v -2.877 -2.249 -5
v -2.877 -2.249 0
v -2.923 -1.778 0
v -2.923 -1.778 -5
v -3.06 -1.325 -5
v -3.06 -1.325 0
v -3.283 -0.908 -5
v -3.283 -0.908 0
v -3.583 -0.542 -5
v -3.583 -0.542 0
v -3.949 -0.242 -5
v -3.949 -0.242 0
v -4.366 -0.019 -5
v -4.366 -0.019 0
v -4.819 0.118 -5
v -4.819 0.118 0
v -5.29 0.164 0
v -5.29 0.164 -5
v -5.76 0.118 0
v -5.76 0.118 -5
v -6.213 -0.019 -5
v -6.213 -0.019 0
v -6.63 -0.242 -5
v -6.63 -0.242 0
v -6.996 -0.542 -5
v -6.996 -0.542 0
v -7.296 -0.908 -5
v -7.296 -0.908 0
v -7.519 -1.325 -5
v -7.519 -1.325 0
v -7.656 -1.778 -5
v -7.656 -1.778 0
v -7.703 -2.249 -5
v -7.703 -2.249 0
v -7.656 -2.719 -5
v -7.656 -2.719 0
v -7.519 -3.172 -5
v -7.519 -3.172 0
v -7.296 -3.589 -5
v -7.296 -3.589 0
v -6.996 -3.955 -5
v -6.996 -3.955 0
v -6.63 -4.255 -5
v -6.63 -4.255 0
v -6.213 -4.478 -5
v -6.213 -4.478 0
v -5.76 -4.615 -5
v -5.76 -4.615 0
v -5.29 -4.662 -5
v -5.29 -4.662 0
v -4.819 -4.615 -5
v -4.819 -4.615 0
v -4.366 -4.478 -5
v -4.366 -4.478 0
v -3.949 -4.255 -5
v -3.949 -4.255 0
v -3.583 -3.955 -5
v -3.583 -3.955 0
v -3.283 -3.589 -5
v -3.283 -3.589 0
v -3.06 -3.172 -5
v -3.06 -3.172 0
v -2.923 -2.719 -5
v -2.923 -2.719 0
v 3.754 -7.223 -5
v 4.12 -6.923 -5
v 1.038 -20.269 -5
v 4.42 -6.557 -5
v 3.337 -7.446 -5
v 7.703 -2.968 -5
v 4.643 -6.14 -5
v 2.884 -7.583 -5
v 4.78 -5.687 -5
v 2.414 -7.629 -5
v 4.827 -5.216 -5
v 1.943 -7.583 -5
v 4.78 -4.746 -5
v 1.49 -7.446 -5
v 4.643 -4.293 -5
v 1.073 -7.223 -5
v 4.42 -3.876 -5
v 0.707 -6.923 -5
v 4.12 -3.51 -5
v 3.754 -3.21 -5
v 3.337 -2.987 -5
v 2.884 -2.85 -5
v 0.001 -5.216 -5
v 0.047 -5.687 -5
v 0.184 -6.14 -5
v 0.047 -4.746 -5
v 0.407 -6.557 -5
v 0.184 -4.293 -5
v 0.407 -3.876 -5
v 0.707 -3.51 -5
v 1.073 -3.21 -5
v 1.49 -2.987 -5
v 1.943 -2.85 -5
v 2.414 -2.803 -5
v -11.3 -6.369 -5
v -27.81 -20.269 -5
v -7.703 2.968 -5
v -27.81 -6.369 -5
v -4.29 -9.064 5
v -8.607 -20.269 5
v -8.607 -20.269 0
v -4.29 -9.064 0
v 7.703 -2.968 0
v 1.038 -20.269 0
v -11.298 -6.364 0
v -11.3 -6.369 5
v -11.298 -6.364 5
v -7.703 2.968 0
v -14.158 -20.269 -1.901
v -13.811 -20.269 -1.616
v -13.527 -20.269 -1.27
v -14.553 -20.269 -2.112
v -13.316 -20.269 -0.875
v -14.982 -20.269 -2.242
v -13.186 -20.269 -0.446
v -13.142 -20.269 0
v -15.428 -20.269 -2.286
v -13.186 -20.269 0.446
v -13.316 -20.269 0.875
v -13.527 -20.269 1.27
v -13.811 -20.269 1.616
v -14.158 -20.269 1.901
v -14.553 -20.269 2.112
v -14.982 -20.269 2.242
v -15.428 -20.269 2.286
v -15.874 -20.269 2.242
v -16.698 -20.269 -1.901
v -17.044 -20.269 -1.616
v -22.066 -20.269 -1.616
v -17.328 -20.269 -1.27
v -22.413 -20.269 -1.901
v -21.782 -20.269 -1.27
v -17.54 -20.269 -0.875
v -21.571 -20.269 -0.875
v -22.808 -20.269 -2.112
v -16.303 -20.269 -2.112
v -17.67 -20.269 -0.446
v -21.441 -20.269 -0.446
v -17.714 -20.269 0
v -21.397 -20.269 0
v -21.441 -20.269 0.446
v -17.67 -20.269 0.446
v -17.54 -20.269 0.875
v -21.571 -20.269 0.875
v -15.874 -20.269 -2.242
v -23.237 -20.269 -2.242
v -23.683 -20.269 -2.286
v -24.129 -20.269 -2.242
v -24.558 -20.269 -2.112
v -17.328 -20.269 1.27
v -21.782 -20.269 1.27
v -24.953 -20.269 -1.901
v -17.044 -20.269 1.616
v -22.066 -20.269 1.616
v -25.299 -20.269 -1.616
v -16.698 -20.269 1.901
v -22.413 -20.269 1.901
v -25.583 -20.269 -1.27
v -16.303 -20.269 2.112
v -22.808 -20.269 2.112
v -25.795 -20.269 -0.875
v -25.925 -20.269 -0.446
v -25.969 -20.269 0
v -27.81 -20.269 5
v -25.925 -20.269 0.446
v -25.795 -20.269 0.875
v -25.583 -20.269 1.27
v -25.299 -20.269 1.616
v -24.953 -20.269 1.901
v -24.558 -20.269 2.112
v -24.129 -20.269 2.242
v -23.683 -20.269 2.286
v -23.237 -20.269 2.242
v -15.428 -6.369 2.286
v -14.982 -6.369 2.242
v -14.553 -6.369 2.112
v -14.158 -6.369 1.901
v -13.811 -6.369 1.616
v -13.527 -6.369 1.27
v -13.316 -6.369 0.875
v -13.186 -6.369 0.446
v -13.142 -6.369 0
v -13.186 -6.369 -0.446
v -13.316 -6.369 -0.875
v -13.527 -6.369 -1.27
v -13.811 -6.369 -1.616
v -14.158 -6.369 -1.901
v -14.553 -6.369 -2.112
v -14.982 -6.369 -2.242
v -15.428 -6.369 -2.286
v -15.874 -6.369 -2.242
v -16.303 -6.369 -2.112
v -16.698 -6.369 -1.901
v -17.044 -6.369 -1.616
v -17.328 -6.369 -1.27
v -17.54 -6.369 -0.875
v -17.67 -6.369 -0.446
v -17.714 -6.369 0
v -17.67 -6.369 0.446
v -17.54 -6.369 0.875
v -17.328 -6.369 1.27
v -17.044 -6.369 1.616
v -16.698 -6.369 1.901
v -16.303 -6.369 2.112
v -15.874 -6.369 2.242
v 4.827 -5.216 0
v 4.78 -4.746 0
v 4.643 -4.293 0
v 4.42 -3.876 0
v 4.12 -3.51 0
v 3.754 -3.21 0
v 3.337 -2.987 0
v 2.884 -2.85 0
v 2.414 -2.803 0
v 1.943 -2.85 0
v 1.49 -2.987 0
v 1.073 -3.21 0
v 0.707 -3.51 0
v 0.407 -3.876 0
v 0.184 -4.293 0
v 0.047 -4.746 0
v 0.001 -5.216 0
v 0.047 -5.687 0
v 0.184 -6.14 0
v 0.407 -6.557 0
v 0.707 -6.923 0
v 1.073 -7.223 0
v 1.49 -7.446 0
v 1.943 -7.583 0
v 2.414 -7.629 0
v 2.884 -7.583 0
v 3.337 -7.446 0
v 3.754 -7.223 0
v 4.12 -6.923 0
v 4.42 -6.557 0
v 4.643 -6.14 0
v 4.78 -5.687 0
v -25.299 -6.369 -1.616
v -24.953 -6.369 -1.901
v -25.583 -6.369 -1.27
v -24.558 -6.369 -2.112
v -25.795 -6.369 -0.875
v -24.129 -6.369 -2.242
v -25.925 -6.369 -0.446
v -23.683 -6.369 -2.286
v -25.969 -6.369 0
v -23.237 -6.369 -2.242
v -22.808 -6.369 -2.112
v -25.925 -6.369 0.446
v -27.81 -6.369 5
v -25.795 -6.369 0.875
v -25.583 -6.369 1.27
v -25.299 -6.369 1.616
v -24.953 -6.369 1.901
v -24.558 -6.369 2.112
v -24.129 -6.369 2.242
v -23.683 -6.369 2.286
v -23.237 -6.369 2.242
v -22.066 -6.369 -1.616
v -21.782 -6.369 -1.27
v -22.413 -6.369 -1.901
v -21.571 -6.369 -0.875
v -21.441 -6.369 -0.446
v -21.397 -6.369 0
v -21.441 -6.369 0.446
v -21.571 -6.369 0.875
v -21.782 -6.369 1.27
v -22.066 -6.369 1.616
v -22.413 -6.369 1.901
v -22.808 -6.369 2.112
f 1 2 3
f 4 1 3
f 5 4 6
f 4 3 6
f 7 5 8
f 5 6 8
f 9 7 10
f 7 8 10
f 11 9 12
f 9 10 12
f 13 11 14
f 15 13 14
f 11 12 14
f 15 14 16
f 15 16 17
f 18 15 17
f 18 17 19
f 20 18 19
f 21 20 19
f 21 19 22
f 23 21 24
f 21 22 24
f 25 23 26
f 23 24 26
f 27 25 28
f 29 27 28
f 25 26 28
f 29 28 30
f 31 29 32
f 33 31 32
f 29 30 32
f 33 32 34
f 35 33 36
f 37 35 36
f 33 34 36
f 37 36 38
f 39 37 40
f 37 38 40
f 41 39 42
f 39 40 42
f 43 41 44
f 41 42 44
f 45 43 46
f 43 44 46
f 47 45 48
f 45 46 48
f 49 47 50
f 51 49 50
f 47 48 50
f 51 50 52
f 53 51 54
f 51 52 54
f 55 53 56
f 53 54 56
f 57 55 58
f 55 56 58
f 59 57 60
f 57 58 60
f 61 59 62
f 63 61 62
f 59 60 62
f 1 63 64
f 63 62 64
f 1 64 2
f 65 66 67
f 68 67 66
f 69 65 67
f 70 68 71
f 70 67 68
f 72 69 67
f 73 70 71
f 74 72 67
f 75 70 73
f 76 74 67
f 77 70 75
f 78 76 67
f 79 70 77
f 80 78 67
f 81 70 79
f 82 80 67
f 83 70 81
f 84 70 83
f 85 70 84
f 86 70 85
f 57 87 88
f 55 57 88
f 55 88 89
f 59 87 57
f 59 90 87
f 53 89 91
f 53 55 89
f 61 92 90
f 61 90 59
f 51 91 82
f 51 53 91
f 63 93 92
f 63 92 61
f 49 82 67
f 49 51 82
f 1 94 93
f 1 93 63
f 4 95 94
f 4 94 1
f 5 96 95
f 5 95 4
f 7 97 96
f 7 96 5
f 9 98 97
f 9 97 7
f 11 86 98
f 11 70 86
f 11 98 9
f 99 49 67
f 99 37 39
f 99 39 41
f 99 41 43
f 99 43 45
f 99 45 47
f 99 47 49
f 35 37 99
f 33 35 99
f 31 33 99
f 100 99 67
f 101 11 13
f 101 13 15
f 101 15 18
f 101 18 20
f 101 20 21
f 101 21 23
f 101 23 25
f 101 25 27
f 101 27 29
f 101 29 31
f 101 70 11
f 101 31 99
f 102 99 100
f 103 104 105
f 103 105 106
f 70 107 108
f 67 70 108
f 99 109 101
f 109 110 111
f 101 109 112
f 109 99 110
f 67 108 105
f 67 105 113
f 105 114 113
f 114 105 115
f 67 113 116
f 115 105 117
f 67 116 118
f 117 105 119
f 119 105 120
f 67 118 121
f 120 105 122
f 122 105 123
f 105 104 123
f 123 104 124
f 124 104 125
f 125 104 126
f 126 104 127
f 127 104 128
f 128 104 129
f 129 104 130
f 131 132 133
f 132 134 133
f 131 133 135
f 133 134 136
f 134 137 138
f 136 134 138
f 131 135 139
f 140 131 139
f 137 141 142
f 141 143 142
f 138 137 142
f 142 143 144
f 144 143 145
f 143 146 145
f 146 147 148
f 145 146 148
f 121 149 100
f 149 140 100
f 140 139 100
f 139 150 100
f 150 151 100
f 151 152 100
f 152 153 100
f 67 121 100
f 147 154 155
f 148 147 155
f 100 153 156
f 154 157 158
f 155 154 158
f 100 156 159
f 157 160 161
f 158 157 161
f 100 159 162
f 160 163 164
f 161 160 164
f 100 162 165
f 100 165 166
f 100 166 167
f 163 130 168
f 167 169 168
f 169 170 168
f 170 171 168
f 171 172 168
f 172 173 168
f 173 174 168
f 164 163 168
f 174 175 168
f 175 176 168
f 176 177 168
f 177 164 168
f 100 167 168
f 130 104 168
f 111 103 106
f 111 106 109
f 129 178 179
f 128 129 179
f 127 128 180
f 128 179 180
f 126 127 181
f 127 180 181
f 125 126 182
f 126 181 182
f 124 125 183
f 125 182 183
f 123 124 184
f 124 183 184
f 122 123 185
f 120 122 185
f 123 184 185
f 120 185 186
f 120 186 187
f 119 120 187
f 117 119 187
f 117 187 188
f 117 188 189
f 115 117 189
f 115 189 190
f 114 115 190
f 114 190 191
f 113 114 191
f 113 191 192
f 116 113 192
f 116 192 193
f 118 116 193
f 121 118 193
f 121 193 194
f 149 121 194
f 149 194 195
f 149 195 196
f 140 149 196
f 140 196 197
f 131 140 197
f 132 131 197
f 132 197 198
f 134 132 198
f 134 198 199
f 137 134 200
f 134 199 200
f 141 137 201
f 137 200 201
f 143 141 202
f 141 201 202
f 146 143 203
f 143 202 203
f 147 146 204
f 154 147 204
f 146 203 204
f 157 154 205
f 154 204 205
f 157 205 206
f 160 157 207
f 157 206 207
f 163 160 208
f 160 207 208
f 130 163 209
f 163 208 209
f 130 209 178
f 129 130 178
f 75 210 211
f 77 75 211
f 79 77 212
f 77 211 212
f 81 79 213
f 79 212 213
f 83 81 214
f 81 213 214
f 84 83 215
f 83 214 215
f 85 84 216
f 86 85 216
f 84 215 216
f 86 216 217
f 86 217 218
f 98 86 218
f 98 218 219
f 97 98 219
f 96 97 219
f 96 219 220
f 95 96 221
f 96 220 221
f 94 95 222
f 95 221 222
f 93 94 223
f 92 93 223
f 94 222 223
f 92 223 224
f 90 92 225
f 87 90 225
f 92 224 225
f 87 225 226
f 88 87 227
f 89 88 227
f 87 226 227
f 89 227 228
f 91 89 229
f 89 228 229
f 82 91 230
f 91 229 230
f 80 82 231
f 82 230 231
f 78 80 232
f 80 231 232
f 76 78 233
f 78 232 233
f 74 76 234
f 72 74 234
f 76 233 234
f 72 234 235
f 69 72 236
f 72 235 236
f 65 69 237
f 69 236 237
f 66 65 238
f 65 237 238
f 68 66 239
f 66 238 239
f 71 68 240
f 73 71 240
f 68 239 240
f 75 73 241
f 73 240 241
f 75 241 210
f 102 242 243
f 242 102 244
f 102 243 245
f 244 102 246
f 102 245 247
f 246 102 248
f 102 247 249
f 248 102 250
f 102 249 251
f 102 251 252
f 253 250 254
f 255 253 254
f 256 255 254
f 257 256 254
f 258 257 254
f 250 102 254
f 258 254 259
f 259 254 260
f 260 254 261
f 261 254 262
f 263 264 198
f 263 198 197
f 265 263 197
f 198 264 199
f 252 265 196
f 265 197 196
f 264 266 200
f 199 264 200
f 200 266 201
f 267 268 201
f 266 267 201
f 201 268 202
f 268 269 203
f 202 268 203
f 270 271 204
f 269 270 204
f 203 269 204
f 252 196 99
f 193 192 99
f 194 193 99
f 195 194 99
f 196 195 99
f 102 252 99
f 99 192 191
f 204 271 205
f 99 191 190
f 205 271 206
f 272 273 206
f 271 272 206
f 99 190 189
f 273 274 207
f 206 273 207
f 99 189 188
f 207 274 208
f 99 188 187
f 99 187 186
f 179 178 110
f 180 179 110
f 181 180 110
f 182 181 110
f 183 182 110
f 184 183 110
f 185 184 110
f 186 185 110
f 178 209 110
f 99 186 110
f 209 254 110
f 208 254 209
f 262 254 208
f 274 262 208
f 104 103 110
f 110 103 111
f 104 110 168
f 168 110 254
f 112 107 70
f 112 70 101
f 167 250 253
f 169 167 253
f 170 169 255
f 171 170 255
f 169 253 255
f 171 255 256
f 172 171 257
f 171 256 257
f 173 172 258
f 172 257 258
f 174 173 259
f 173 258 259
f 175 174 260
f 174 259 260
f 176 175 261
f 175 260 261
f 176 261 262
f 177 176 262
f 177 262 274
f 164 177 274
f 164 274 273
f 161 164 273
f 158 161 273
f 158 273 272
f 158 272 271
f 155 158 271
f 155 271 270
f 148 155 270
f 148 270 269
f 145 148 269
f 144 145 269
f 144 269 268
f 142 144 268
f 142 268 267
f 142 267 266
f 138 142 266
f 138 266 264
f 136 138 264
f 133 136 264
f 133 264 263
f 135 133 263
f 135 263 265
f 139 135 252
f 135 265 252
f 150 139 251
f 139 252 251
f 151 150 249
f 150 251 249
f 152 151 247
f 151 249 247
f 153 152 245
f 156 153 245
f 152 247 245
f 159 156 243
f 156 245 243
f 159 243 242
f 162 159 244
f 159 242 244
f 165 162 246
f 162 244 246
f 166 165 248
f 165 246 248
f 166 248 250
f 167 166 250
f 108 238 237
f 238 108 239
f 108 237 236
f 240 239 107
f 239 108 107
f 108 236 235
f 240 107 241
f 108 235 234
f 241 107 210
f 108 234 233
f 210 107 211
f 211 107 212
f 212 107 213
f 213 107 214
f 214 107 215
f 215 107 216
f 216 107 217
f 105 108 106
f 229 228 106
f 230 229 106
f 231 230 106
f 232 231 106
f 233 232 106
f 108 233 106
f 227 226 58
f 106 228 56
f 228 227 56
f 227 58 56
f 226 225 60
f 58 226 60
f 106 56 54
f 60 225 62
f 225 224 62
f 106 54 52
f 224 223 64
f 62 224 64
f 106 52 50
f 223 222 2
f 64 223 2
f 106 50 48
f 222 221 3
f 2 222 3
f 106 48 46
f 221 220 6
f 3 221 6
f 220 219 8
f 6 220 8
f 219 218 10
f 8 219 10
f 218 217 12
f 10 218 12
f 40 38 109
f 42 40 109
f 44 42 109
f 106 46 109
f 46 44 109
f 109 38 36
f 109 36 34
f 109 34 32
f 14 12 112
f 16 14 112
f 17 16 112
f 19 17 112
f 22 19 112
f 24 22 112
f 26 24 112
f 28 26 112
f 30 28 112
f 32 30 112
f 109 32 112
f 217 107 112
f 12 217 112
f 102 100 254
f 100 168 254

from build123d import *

# Parameters (mm, degrees)
BASE_EXTRUDE_DEPTH                           = 5
CUTAWAY_FOR_CLAMP_PLATE_WIRE_DEPTH           = 5
SKETCH3_R                                    = 2.413
CLAMP_PLATE_HOLES_ALTERED_TO_10_24_OCT_DEPTH = 5
HOLES_TO_PITCH_PLATE_REACH                   = 15.9
SKETCH4_R                                    = 2.286


with BuildPart() as part:
    # Sketch1 → Base-Extrude (new body, symmetric)
    with BuildSketch(Plane.XY):
        Polygon((-7.703086391, 2.967740731), (0, 0), (7.703086391, -2.967740731), (1.037503031, -20.268970563), (-27.810207986, -20.268970563), (-27.810207986, -6.368970563), (-11.300207986, -6.368970563), align=None)
    extrude(amount=BASE_EXTRUDE_DEPTH, both=True)

    # Sketch2 → Cutaway for Clamp Plate & Wire (cut)
    with BuildSketch(Plane.XY.offset(5)):
        Polygon((-7.703086391, 2.967740731), (7.703086391, -2.967740731), (1.037503031, -20.268970563), (-8.607332328, -20.268970563), (-4.290273371, -9.06358535), (-11.298169046, -6.363678277), align=None)
    extrude(amount=-CUTAWAY_FOR_CLAMP_PLATE_WIRE_DEPTH, mode=Mode.SUBTRACT)

    # Sketch3 → Clamp Plate Holes (altered to #10-24 OCT04) (cut)
    with BuildSketch(Plane.XY):
        with Locations((2.413510134, -5.216437969)):
            Circle(SKETCH3_R)
        with Locations((-5.289576257, -2.248697238)):
            Circle(SKETCH3_R)
    extrude(amount=-CLAMP_PLATE_HOLES_ALTERED_TO_10_24_OCT_DEPTH, mode=Mode.SUBTRACT)

    # Sketch4 → Holes to Pitch Plate (cut, up to next)
    with BuildSketch(Plane(origin=(0, -6.368970563, 0), x_dir=(-1, 0, 0), z_dir=(0, 1, 0)), mode=Mode.PRIVATE) as holes_to_pitch_plate_sk1:
        with Locations((23.682707986, 0)):
            Circle(SKETCH4_R)
    holes_to_pitch_plate_tool1 = extrude(holes_to_pitch_plate_sk1.sketch, amount=-HOLES_TO_PITCH_PLATE_REACH, mode=Mode.PRIVATE) & part.part
    add(holes_to_pitch_plate_tool1.solids().sort_by_distance((-23.682708, -6.368971, 0))[0], mode=Mode.SUBTRACT)
    # Sketch4 → Holes to Pitch Plate (cut, up to next)
    with BuildSketch(Plane(origin=(0, -6.368970563, 0), x_dir=(-1, 0, 0), z_dir=(0, 1, 0)), mode=Mode.PRIVATE) as holes_to_pitch_plate_sk2:
        with Locations(Location((15.427707986, 0, 0), (0, 0, 90))):  # turned: the seam where the file's is
            Circle(SKETCH4_R)
    holes_to_pitch_plate_tool2 = extrude(holes_to_pitch_plate_sk2.sketch, amount=-HOLES_TO_PITCH_PLATE_REACH, mode=Mode.PRIVATE) & part.part
    add(holes_to_pitch_plate_tool2.solids().sort_by_distance((-15.427708, -6.368971, 0))[0], mode=Mode.SUBTRACT)


solid = part.part
